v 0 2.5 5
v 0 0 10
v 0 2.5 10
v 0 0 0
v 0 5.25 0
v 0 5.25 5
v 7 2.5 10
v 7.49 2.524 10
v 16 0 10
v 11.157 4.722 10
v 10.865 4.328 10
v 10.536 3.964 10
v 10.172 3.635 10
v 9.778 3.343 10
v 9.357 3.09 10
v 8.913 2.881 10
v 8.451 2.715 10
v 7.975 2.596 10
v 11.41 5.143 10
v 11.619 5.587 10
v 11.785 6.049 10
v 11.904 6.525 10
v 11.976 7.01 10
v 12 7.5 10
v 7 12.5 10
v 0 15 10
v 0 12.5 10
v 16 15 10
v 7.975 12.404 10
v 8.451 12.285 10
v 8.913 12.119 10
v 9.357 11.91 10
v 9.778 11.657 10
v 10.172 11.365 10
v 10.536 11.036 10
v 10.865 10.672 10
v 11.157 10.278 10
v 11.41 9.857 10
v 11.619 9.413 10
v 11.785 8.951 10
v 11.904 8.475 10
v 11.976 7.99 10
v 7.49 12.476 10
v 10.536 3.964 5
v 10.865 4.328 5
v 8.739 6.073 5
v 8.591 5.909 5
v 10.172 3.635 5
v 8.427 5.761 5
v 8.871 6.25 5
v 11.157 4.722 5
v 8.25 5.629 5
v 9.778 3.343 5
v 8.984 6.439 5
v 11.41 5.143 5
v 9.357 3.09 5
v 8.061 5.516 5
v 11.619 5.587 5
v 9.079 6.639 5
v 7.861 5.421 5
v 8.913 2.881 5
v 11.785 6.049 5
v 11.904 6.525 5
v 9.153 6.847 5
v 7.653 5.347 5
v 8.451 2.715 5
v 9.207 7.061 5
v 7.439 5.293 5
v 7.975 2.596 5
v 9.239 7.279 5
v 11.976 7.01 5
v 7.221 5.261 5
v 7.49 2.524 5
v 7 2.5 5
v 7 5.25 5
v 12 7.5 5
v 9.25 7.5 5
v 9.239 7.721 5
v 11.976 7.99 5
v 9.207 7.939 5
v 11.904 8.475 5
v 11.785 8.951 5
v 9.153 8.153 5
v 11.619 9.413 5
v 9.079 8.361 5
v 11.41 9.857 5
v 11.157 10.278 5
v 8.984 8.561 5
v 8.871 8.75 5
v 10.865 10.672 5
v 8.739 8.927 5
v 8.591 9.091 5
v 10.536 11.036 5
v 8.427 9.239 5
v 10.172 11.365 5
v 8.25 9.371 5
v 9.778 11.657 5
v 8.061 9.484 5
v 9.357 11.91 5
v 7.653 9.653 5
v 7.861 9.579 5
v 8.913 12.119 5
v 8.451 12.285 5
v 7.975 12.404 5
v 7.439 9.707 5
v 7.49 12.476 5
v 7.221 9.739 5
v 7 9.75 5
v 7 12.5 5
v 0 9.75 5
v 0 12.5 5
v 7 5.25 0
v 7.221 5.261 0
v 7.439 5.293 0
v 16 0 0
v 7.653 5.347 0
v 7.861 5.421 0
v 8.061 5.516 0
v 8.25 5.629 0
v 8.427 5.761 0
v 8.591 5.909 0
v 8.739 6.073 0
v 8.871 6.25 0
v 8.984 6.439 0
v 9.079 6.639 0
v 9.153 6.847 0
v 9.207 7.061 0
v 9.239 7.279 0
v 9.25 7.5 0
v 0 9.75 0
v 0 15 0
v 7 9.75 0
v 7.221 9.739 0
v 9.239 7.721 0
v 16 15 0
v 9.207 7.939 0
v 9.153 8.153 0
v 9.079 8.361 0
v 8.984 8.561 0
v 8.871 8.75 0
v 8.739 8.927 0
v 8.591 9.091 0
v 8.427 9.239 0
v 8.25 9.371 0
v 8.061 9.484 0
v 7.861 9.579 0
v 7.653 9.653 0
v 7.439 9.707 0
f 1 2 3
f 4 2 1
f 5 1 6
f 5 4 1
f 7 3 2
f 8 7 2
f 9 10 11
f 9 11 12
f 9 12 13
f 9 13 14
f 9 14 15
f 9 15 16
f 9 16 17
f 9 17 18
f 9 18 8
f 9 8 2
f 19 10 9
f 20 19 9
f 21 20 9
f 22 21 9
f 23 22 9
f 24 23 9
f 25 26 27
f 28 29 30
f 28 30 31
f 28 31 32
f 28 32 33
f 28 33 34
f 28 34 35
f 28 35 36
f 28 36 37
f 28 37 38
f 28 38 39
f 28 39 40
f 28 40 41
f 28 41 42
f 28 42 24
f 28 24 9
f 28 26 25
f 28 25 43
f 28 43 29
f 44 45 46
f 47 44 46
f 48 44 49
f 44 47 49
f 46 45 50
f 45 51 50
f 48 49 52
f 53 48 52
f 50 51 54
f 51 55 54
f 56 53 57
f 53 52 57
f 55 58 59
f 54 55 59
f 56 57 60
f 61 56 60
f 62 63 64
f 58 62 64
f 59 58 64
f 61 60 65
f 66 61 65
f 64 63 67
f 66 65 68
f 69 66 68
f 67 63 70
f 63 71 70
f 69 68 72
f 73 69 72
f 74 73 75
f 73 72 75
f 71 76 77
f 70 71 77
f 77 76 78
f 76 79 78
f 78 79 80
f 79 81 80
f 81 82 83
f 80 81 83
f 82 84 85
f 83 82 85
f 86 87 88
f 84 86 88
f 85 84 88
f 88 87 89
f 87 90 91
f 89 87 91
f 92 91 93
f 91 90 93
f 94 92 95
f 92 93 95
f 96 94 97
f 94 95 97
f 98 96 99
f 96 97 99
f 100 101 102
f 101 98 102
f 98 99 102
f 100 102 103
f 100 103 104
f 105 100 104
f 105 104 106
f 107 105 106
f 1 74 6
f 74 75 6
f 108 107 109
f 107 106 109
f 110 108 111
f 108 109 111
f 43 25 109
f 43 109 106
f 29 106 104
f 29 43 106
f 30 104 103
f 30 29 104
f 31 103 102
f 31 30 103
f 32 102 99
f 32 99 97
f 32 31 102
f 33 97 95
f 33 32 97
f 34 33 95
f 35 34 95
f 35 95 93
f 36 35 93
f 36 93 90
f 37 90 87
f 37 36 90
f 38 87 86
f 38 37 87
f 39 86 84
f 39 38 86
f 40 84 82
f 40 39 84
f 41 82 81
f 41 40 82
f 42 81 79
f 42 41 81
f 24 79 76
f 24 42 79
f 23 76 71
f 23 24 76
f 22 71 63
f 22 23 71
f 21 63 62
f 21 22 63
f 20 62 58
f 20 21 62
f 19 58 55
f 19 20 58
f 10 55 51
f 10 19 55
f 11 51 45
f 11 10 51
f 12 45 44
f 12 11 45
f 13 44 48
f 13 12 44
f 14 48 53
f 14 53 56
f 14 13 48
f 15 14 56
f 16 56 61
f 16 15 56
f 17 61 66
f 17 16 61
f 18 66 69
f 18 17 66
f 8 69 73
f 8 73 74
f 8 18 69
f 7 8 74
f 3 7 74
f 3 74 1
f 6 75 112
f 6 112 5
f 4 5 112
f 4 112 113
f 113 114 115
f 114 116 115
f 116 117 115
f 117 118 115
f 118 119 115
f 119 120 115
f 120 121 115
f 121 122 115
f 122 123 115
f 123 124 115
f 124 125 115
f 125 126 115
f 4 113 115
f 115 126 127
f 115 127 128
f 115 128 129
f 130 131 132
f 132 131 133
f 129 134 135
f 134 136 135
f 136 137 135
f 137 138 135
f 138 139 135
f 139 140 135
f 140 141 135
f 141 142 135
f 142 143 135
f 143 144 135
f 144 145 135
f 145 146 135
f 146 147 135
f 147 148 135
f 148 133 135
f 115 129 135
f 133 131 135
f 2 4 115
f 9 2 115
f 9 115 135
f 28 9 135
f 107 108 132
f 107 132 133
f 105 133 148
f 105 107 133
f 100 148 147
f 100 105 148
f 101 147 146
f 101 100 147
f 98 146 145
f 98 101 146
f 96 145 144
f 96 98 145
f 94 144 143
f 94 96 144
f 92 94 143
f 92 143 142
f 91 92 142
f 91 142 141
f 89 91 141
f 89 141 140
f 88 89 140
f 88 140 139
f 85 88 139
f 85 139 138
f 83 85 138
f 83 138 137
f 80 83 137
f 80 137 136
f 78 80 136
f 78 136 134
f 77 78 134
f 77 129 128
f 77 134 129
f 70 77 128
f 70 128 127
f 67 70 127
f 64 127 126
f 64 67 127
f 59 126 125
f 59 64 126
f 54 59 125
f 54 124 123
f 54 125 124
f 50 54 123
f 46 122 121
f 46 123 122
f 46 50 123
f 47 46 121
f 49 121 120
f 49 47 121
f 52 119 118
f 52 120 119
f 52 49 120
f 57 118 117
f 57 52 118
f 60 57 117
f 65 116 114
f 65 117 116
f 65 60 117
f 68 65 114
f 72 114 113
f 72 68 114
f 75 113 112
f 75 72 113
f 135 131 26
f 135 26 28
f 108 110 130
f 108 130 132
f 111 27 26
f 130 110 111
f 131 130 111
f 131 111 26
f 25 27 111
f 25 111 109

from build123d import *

# Parameters (mm, degrees)
SKIZZE1_W                       = 16
SKIZZE1_H                       = 15
AUFSATZ_LINEAR_AUSTRAGEN1_DEPTH = 10
SCHNITT_LINEAR_AUSTRAGEN1_DEPTH = 5
SCHNITT_LINEAR_AUSTRAGEN2_DEPTH = 6


with BuildPart() as part:
    # Skizze1 → Aufsatz-Linear austragen1 (new body)
    with BuildSketch(Plane.XY):
        with Locations((8, 7.5)):
            Rectangle(SKIZZE1_W, SKIZZE1_H)
    extrude(amount=AUFSATZ_LINEAR_AUSTRAGEN1_DEPTH)

    # Skizze2 → Schnitt-Linear austragen1 (cut)
    with BuildSketch(Plane.XY.offset(10)):
        with BuildLine():
            Line((0, 12.5), (7, 12.5))
            ThreePointArc((7, 12.5), (12, 7.5), (7, 2.5))
            Line((7, 2.5), (0, 2.5))
            ThreePointArc((0, 2.5), (-5, 7.5), (0, 12.5))
        make_face()
    extrude(amount=-SCHNITT_LINEAR_AUSTRAGEN1_DEPTH, mode=Mode.SUBTRACT)

    # Skizze3 → Schnitt-Linear austragen2 (cut, through all)
    with BuildSketch(Plane.XY.offset(5)):
        with BuildLine():
            Line((0, 9.75), (7, 9.75))
            ThreePointArc((7, 9.75), (9.25, 7.5), (7, 5.25))
            Line((7, 5.25), (0, 5.25))
            ThreePointArc((0, 5.25), (-2.25, 7.5), (0, 9.75))
        make_face()
    extrude(amount=-SCHNITT_LINEAR_AUSTRAGEN2_DEPTH, mode=Mode.SUBTRACT)


solid = part.part
